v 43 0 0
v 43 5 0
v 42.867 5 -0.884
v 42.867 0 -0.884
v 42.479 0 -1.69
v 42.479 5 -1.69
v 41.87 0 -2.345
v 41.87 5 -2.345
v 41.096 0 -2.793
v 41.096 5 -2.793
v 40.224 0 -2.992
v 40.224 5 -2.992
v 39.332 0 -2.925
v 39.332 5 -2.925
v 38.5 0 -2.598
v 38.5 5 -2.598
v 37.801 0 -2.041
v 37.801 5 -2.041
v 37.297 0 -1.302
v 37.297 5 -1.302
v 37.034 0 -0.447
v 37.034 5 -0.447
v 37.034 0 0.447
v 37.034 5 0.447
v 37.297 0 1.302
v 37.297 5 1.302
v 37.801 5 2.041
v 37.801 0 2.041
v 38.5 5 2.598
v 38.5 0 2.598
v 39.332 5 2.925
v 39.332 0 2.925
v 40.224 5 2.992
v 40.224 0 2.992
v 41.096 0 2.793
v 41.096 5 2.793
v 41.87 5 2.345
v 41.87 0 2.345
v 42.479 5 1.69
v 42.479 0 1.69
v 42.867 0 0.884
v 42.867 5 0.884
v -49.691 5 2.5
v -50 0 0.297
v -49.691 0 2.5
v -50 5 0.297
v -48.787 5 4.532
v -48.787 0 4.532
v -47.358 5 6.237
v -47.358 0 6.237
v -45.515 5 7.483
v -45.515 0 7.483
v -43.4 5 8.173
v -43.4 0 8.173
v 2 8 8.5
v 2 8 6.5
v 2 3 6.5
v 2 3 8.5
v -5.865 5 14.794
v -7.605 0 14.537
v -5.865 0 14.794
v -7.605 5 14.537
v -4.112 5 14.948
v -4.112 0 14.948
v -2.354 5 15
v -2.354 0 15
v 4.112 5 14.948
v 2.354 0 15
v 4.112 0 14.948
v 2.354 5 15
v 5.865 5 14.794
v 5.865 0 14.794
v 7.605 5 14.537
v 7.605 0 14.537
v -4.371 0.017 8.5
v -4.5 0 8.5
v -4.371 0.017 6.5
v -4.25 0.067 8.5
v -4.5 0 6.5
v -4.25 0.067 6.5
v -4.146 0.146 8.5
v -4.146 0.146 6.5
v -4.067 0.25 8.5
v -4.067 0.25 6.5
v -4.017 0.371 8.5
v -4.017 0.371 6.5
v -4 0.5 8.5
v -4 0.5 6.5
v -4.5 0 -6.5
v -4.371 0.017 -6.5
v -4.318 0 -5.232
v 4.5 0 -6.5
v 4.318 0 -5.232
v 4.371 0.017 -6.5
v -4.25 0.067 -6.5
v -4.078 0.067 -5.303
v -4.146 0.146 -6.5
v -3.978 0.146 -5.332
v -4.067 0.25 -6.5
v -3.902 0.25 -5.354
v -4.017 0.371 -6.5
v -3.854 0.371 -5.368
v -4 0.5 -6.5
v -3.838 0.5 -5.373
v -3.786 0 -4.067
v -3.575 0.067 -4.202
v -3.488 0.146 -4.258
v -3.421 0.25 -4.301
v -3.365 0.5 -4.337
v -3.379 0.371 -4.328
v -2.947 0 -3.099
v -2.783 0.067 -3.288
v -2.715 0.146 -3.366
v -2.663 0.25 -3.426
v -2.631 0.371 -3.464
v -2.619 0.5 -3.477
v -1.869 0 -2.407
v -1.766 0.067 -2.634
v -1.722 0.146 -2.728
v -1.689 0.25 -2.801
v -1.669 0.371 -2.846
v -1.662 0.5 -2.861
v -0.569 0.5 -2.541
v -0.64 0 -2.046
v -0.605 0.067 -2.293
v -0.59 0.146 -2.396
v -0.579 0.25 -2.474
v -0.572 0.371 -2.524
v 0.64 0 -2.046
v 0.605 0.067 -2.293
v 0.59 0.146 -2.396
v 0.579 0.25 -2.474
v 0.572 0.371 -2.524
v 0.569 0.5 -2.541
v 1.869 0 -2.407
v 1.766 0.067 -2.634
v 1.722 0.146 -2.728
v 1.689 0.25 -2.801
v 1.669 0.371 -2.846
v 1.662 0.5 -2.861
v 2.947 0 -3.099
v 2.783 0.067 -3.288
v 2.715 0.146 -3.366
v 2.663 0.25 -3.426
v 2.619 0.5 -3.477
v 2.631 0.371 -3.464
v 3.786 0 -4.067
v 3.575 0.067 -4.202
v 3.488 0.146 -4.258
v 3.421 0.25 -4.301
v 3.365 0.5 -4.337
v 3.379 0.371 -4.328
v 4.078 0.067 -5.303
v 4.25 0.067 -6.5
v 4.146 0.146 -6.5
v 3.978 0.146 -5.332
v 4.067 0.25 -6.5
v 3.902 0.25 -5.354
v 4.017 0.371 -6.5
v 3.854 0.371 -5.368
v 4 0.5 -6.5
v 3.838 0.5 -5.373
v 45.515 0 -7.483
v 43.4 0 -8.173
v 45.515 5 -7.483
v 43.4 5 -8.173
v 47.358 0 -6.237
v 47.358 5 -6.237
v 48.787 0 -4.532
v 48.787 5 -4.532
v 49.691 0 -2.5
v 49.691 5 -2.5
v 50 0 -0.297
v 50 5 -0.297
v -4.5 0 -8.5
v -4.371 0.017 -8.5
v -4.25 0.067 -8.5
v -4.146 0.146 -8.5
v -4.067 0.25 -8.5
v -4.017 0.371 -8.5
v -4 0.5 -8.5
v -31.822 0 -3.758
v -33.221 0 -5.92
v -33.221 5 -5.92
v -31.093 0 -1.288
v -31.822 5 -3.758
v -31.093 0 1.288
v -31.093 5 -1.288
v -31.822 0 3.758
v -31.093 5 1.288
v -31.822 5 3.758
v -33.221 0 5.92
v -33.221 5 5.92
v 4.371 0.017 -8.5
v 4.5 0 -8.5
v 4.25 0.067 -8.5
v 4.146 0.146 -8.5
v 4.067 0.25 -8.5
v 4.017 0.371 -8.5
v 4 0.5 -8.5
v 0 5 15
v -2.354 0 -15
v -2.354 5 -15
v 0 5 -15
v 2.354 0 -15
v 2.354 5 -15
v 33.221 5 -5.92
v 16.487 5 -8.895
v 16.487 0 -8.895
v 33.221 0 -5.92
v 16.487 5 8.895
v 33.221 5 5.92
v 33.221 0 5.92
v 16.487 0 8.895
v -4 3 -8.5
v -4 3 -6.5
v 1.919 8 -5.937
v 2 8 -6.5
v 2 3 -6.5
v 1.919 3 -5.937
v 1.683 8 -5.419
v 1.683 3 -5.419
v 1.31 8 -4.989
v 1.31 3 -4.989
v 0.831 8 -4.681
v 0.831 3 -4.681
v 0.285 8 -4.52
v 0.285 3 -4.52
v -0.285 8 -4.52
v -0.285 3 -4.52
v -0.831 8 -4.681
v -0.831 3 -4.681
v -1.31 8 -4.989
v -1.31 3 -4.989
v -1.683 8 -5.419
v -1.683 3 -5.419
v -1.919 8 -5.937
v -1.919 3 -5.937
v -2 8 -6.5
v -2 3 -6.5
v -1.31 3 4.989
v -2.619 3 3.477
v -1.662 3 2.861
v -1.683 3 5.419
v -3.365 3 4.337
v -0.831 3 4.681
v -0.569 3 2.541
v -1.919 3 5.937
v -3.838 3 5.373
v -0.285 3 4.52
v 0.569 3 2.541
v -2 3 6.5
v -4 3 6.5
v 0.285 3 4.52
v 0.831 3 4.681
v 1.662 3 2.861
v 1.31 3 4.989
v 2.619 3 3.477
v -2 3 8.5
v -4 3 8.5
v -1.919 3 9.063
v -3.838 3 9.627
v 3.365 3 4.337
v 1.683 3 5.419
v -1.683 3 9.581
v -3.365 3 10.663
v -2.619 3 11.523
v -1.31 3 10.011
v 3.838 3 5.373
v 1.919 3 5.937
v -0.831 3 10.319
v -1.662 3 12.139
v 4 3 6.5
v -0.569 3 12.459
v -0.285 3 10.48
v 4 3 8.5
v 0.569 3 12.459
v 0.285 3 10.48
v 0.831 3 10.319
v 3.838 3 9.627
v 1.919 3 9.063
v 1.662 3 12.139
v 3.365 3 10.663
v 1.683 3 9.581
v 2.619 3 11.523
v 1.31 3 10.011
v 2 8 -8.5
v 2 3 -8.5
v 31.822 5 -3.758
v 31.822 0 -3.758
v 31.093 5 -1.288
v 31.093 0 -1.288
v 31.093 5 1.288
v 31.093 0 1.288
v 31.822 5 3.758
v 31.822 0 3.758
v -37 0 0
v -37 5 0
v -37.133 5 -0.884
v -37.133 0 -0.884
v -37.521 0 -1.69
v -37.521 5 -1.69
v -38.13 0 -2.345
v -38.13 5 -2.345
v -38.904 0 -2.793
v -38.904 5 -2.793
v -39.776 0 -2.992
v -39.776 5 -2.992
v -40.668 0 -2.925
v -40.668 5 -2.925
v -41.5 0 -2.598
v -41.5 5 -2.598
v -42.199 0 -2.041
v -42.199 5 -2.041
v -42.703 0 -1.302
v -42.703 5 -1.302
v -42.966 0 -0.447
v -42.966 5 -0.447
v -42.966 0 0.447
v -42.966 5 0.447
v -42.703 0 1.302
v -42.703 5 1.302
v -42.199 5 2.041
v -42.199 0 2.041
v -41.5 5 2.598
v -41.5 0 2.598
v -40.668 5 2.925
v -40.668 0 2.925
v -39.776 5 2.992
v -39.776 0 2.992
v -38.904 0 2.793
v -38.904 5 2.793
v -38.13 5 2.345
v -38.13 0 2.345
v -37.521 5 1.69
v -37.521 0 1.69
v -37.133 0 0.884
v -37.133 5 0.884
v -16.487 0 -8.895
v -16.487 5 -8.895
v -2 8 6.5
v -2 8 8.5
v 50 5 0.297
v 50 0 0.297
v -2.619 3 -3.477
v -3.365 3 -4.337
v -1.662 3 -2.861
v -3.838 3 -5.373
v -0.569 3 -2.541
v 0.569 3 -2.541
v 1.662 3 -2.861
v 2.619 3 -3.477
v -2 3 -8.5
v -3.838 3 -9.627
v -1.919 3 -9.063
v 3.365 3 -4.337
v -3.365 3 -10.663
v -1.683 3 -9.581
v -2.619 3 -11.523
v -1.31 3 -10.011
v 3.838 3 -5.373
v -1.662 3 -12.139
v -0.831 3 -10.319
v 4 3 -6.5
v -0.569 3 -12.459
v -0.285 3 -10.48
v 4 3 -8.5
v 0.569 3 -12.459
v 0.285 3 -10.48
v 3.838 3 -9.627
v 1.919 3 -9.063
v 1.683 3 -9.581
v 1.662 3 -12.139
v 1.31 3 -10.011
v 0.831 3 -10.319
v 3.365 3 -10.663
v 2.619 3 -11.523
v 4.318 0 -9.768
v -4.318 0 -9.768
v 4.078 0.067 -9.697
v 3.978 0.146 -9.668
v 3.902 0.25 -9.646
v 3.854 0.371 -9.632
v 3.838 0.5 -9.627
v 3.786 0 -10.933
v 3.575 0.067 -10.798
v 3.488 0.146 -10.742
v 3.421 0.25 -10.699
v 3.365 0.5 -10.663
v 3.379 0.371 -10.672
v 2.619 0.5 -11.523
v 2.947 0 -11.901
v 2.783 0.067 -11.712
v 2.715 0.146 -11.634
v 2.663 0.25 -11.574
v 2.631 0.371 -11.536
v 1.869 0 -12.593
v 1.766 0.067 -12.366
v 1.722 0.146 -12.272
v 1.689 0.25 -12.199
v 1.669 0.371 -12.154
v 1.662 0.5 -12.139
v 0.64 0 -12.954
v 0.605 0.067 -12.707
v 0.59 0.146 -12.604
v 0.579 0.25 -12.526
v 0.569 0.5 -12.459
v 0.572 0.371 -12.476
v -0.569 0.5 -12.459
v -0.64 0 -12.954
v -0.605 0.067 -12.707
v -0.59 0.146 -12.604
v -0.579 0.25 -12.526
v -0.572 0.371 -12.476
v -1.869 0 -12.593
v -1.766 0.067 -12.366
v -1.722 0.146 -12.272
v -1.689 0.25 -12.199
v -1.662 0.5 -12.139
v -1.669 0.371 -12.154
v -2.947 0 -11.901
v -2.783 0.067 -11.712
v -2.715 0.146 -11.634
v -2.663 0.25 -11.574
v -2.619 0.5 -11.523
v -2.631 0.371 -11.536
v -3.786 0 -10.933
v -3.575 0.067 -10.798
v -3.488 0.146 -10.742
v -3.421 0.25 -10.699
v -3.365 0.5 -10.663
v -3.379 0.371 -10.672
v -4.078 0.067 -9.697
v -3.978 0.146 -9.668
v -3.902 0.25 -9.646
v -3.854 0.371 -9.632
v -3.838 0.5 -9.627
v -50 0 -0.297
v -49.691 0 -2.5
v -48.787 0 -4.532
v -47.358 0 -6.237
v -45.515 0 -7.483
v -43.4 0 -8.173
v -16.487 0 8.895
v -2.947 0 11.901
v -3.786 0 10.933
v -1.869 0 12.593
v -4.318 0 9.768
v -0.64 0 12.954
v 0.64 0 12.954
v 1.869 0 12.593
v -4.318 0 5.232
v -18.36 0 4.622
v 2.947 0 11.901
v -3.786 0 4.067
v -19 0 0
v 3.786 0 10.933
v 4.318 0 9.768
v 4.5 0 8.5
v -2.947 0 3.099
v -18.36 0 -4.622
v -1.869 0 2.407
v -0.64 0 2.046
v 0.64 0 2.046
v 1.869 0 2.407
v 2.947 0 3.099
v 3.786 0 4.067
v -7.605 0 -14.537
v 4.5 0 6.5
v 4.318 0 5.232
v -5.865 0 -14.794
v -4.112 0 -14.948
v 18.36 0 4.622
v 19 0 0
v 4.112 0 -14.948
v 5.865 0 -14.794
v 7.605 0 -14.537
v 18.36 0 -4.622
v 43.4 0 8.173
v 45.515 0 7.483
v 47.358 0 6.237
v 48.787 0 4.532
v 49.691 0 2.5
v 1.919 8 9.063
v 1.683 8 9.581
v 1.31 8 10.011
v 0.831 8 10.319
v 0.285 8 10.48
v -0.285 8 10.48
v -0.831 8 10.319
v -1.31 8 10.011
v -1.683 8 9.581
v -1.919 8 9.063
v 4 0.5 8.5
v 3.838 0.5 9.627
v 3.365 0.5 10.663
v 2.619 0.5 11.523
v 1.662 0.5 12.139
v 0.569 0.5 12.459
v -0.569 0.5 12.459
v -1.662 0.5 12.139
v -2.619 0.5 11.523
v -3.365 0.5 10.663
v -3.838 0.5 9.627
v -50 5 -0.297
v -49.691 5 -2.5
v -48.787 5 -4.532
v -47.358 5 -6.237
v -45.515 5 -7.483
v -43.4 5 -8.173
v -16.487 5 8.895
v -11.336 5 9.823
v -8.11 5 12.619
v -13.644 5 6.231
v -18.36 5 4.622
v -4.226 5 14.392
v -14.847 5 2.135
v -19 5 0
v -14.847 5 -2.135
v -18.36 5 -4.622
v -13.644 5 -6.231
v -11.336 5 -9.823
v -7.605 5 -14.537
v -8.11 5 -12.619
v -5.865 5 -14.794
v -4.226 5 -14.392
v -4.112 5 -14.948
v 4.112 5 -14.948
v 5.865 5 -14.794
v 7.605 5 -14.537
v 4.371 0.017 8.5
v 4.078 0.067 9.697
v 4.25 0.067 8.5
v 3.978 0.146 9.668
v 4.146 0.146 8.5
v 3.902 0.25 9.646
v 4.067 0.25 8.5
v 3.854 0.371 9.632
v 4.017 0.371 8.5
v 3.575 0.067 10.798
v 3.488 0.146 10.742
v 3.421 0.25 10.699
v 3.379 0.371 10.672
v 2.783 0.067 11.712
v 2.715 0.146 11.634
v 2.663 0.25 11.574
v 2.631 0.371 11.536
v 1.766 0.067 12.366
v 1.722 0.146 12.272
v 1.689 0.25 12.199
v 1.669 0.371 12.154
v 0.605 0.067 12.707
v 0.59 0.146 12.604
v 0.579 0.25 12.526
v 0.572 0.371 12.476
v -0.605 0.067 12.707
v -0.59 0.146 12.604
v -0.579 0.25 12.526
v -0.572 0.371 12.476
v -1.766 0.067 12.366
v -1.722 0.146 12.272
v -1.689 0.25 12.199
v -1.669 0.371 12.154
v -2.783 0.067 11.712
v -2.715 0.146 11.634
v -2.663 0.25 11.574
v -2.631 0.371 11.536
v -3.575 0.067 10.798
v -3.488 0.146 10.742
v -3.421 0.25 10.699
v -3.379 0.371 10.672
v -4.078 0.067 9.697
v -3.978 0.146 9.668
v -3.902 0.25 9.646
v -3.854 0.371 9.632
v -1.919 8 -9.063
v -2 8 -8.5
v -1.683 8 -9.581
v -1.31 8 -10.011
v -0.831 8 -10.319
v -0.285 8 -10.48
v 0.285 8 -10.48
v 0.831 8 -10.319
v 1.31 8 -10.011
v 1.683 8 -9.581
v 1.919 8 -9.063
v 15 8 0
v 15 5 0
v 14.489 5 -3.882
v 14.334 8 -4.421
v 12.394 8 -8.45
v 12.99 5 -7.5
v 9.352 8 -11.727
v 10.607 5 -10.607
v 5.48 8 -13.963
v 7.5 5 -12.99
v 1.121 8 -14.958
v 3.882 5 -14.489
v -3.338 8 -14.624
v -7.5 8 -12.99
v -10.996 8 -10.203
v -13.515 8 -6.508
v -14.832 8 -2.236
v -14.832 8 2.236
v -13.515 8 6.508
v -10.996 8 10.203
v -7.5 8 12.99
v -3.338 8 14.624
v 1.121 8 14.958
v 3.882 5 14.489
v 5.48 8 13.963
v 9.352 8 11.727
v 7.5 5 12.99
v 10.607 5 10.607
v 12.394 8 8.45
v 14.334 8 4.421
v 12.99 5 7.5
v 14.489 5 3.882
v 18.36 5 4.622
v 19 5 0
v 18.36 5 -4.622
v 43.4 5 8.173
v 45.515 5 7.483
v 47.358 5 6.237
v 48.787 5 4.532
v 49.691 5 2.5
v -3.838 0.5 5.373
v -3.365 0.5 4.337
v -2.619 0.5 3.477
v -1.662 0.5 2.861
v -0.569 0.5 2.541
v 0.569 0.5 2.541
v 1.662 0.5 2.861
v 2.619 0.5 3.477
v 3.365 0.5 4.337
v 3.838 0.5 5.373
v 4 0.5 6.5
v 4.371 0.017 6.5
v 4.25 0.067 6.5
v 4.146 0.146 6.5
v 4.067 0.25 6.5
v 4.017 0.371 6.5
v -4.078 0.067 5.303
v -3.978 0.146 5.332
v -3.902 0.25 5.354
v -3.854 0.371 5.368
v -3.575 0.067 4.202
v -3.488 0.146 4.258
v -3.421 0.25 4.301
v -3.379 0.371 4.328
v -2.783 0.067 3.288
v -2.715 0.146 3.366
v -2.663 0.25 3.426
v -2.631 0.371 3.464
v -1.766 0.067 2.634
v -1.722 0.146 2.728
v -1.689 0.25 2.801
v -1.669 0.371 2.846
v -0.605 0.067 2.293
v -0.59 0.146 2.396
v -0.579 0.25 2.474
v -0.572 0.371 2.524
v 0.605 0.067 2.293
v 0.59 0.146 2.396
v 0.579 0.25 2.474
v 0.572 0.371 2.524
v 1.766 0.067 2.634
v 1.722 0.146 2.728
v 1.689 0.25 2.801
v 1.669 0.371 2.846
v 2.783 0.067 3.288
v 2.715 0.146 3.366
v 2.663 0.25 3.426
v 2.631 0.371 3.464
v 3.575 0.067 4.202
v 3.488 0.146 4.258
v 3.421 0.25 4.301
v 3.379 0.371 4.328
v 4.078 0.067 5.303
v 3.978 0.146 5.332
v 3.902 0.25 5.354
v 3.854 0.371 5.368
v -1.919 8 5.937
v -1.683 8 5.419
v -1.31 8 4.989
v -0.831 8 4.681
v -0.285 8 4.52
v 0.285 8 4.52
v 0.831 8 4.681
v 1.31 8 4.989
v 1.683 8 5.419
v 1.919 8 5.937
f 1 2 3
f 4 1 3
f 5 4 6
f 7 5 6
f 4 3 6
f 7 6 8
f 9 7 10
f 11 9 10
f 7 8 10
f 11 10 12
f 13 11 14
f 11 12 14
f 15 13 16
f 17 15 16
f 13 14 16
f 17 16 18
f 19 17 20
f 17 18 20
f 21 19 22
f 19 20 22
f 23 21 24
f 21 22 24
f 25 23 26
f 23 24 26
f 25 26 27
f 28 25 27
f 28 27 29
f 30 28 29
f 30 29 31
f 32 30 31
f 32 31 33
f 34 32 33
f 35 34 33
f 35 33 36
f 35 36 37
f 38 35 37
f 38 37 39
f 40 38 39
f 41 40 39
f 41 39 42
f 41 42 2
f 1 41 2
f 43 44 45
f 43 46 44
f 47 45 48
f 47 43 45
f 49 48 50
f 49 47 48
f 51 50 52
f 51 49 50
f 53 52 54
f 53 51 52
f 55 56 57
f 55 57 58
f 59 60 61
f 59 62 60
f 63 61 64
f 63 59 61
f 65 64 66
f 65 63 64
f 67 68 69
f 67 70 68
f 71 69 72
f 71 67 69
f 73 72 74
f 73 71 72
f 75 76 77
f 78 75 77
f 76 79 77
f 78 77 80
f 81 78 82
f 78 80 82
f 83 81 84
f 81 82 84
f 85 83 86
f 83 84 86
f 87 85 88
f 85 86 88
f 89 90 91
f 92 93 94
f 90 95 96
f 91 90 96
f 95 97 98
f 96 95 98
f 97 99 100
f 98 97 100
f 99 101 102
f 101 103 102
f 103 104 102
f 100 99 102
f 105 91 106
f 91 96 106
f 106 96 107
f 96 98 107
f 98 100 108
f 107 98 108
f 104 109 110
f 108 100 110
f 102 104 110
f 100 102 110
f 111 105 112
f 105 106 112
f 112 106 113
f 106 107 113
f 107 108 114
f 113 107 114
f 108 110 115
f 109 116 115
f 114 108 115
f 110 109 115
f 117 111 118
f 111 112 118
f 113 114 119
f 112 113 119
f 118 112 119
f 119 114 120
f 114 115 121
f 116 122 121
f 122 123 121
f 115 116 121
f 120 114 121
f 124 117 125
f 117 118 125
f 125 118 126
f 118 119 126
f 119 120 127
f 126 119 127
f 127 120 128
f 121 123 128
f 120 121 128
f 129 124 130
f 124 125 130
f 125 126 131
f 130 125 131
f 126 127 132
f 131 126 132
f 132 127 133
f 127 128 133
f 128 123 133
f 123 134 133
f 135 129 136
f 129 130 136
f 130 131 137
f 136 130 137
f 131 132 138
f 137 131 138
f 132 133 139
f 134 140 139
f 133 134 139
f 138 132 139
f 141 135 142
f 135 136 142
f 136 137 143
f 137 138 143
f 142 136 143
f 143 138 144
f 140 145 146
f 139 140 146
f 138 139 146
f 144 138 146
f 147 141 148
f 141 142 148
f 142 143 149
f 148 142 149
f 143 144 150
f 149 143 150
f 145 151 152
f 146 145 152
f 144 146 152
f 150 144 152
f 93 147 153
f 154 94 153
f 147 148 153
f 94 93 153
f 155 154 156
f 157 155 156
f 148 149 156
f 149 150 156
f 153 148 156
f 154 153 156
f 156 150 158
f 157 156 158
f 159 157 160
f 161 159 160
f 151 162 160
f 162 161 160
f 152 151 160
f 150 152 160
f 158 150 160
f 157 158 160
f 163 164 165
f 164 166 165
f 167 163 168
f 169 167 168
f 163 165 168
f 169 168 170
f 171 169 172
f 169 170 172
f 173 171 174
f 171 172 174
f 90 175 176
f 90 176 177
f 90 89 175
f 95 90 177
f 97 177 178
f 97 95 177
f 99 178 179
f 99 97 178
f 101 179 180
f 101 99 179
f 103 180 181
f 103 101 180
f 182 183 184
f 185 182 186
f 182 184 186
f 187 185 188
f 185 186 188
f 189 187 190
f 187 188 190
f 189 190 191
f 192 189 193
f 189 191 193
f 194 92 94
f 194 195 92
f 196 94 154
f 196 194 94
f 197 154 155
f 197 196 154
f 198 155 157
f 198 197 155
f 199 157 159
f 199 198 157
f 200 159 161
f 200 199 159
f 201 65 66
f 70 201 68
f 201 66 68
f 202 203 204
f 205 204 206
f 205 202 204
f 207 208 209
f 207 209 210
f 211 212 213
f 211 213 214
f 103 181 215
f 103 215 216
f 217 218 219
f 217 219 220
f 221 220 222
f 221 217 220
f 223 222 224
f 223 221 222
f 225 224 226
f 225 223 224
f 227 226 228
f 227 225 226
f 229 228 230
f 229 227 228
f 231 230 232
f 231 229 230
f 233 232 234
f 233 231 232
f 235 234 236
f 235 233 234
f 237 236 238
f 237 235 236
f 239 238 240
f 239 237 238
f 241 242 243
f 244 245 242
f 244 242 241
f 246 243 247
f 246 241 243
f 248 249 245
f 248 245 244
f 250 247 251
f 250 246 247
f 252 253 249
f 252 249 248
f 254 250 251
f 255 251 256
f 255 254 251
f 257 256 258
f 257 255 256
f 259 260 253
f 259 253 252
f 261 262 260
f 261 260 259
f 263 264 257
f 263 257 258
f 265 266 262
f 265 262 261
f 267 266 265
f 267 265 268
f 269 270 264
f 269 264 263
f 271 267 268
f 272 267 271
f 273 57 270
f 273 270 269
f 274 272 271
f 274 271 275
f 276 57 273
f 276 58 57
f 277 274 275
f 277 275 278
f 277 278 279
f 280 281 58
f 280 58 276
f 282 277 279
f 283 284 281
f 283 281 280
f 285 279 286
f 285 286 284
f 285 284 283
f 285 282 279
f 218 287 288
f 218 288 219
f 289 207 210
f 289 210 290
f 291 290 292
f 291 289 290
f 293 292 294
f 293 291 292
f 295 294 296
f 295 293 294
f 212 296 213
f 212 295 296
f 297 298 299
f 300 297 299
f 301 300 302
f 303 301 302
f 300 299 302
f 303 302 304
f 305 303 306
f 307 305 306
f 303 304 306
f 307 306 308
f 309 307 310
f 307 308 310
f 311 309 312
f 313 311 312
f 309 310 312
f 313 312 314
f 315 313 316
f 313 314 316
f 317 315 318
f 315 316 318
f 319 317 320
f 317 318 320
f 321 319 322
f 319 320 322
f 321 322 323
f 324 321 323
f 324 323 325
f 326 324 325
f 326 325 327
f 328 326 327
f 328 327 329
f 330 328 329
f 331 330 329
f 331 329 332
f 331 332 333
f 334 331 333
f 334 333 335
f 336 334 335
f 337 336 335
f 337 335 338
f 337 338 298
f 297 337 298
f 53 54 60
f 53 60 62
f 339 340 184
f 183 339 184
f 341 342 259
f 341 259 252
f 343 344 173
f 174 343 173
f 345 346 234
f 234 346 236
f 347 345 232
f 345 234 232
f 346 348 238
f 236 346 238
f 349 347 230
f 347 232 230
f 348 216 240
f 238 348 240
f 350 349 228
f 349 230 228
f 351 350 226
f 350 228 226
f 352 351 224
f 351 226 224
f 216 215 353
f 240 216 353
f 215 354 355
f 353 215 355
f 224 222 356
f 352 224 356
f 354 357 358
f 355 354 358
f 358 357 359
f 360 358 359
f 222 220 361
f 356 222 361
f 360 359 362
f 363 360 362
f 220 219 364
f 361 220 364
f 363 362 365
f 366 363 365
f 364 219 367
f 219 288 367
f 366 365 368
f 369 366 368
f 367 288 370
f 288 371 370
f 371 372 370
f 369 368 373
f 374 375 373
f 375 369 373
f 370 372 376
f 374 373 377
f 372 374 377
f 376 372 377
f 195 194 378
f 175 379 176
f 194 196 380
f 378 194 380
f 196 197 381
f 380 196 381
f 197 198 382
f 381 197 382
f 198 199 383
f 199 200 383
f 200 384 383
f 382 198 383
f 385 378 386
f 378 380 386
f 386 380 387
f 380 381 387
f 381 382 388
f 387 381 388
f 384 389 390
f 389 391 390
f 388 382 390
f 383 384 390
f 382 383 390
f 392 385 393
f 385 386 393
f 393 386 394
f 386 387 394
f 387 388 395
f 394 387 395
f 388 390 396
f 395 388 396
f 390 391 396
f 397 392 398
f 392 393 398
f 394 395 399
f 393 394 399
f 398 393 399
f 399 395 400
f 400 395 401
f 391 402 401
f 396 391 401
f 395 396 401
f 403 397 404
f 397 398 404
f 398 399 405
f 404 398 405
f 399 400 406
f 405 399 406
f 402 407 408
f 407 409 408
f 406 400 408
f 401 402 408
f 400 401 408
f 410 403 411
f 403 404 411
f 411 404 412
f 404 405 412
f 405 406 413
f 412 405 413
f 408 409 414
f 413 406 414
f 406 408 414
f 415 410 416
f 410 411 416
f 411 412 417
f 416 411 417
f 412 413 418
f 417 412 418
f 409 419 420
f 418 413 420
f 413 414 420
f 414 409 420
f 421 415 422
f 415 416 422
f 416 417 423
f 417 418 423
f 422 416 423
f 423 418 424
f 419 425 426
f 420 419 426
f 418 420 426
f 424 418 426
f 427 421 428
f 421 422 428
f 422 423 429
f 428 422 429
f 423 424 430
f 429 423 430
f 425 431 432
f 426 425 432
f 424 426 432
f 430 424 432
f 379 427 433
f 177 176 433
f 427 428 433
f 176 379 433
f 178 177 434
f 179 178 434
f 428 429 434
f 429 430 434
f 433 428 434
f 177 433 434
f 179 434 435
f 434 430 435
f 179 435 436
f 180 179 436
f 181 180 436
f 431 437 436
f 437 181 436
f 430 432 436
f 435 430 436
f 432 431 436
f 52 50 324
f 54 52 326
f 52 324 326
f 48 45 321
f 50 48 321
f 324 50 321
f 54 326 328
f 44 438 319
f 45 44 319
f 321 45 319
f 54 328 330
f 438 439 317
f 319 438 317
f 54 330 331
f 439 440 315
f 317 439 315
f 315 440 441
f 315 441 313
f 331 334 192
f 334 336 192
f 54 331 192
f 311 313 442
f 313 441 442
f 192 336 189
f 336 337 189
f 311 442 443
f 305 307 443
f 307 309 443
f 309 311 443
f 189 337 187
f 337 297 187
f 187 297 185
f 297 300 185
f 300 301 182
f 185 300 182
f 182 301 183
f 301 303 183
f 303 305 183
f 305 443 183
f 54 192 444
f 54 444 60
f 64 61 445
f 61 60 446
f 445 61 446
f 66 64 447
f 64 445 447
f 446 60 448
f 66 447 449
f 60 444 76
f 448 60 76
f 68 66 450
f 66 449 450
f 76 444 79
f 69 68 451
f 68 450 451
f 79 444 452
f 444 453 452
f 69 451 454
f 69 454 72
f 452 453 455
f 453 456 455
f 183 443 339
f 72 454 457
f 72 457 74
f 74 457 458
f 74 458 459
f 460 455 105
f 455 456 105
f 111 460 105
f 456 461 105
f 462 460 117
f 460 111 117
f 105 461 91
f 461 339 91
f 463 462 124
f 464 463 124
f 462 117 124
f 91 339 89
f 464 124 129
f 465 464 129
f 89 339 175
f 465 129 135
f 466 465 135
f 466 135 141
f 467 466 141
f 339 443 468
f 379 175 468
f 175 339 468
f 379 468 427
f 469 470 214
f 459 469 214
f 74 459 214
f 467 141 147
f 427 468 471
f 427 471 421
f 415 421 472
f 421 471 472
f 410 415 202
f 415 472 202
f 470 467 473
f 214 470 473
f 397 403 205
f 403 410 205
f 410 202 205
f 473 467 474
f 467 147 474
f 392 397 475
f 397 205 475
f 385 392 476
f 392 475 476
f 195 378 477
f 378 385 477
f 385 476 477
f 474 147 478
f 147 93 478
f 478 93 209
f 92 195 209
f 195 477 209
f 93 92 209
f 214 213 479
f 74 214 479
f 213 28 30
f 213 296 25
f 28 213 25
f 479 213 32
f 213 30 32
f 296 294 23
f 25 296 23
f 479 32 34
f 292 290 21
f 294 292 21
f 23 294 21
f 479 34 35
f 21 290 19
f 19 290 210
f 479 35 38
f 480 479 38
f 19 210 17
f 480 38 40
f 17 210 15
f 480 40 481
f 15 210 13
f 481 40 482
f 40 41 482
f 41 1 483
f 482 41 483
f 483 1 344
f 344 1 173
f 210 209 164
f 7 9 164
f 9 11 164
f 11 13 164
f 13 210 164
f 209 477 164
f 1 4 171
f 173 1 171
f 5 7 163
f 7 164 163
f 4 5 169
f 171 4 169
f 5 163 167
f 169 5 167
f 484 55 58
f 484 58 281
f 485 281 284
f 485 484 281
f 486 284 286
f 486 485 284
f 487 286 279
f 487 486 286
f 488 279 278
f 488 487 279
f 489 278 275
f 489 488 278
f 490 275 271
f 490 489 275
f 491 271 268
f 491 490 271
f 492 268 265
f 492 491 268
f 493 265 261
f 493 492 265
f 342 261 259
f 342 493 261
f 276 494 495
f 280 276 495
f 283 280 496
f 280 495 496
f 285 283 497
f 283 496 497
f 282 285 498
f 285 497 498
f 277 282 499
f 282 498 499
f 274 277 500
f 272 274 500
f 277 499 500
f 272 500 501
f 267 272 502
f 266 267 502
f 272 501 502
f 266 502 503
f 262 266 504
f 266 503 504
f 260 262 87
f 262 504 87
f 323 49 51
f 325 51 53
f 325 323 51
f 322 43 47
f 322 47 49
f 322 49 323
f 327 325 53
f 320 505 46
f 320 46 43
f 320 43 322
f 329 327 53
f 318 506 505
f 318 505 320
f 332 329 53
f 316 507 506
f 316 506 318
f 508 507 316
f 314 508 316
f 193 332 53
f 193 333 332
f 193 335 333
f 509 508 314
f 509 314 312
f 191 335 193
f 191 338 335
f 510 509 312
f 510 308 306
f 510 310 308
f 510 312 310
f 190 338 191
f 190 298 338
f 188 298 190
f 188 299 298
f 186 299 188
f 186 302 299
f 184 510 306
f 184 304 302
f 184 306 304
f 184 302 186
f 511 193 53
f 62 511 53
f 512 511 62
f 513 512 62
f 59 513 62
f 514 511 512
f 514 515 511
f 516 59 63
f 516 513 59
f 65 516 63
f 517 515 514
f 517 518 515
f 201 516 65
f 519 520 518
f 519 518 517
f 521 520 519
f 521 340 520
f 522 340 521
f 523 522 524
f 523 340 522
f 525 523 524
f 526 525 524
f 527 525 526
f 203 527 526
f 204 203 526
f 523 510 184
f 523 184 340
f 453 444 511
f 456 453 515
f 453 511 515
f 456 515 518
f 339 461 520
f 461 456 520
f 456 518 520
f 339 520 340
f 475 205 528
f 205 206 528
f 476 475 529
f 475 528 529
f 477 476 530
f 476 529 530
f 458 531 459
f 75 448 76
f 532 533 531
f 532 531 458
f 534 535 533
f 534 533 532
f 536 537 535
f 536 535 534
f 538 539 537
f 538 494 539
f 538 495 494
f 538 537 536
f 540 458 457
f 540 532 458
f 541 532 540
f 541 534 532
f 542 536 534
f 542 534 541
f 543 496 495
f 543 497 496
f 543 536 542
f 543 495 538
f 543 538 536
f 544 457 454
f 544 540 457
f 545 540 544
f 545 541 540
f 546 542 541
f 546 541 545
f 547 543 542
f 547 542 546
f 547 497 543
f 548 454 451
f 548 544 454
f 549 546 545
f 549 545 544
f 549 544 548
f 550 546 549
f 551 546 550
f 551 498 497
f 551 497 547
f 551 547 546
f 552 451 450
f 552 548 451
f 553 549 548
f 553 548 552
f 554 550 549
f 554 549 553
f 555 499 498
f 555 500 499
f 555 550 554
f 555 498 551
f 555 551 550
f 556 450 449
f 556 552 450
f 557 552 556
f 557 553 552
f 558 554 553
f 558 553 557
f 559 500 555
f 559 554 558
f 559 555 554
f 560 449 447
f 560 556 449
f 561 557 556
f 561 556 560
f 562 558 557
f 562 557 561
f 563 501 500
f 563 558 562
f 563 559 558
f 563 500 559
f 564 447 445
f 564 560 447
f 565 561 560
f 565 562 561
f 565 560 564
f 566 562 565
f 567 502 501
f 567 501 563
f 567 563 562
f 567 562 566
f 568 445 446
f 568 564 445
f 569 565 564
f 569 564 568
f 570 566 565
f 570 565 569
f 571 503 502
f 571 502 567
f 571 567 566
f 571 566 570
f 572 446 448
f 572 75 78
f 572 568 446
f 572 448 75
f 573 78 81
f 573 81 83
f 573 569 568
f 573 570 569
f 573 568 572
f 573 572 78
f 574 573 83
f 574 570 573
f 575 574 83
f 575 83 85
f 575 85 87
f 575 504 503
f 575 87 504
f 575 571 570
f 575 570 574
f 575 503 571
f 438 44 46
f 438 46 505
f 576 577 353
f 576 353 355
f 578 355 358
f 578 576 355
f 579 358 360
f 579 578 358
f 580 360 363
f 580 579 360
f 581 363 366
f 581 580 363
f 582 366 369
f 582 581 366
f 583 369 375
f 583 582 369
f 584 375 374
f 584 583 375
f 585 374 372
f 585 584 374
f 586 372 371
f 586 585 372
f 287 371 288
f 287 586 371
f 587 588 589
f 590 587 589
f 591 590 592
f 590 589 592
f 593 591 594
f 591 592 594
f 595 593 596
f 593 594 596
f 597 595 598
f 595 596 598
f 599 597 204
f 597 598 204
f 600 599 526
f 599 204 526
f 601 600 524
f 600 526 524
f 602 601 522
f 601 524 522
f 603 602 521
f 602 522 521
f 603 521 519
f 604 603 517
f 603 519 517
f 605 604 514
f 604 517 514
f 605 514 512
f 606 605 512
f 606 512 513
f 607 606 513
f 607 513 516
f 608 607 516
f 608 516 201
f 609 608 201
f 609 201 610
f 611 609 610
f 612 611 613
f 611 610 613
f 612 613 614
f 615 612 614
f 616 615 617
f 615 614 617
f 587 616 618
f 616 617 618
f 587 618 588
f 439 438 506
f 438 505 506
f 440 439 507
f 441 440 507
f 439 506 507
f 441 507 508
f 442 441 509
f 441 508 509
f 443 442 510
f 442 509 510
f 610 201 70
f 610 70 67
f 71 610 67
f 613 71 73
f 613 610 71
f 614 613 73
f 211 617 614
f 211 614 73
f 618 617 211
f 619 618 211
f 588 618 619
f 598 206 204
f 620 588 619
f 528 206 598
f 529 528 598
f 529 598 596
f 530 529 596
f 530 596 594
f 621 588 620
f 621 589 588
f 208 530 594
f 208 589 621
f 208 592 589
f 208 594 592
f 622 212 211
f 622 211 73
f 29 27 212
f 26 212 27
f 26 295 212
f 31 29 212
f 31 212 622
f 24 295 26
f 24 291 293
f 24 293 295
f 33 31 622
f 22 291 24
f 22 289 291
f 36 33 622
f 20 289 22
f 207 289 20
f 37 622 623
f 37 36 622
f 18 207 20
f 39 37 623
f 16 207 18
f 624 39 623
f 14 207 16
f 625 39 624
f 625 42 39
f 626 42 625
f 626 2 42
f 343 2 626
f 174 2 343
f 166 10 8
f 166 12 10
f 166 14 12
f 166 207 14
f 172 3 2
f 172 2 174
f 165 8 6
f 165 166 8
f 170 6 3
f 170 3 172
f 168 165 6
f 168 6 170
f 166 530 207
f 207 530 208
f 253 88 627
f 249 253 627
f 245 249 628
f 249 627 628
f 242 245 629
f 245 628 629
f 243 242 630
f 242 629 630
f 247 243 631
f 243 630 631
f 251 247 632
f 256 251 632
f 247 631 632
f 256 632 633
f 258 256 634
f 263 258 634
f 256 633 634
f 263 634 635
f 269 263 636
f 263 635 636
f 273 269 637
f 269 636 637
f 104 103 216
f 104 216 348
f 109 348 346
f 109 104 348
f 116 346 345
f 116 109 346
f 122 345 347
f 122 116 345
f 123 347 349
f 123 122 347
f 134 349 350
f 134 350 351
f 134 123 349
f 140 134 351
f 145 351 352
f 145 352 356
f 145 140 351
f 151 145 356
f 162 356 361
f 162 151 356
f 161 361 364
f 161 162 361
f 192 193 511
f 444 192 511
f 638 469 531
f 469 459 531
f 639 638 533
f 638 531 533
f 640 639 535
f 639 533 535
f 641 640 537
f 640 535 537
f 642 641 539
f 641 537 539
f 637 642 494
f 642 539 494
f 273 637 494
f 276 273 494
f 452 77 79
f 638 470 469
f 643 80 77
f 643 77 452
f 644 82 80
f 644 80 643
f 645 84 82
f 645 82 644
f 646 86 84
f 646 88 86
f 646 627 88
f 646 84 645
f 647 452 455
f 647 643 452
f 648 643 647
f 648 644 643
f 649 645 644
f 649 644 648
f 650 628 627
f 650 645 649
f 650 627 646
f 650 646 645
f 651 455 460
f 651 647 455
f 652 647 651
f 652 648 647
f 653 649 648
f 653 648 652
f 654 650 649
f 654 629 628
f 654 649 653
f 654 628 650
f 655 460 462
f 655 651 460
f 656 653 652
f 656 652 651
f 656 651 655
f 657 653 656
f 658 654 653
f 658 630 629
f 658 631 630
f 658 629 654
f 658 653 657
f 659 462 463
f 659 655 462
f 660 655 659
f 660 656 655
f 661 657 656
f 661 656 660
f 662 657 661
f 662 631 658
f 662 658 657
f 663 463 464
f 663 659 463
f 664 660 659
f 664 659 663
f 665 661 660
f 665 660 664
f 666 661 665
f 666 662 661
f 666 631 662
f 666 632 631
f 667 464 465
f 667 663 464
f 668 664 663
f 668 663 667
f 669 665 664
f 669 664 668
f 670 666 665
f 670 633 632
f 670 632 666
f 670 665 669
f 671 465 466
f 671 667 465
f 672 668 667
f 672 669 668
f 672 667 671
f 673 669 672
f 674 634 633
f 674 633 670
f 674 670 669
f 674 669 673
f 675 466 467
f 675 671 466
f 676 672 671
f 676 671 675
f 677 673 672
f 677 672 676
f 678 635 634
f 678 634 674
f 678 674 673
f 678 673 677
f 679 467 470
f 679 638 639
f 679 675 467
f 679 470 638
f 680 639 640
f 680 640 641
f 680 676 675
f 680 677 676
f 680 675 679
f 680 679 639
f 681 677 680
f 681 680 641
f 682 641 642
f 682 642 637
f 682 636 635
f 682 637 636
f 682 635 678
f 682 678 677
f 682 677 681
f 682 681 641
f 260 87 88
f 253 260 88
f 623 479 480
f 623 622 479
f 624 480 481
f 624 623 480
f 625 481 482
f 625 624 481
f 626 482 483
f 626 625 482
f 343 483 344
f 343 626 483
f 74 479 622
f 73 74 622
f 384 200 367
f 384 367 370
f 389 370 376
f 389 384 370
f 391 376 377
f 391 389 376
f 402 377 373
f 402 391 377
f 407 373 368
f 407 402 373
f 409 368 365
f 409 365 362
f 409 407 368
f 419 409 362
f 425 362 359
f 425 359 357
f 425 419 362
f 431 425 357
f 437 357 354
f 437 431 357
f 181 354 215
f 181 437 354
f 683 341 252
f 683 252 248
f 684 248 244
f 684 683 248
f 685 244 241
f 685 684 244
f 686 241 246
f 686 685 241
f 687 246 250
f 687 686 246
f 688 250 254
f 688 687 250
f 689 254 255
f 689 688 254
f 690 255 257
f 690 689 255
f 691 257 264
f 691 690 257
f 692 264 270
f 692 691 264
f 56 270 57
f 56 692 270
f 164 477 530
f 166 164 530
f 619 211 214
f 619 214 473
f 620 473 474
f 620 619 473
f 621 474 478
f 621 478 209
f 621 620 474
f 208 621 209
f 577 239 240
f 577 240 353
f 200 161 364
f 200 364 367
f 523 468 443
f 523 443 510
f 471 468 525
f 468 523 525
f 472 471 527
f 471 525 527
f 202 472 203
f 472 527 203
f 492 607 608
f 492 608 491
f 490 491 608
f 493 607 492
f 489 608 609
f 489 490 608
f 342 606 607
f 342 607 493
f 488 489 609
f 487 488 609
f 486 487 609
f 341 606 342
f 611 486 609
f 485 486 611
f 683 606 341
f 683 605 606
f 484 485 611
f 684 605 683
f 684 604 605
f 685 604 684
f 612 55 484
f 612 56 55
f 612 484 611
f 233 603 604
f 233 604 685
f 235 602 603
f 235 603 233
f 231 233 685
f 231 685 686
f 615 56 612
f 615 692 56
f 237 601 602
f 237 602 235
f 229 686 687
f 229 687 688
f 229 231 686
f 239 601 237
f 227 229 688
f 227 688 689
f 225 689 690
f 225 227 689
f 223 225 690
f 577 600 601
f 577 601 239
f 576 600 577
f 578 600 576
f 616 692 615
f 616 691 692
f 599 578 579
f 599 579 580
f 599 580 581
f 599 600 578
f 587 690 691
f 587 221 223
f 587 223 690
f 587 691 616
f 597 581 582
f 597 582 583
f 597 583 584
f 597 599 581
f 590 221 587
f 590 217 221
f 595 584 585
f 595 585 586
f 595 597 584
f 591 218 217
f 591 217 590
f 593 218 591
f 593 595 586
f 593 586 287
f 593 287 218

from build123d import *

# Parameters (mm, degrees)
SKETCH1_W           = 100
SKETCH1_H           = 30
BOSS_EXTRUDE1_DEPTH = 5
SKETCH2_R           = 15
BOSS_EXTRUDE2_DEPTH = 3
CUT_EXTRUDE1_DEPTH  = 9
SKETCH4_R           = 3
CUT_EXTRUDE2_DEPTH  = 6
CHAMFER1_SIZE       = 8
CHAMFER1_SIZE2      = 45
CHAMFER2_SIZE       = 45
CHAMFER2_SIZE2      = 8
CHAMFER3_SIZE       = 45
CHAMFER3_SIZE2      = 8
CHAMFER4_SIZE       = 8
CHAMFER4_SIZE2      = 45
FILLET1_R           = 8
CUT_EXTRUDE3_DEPTH  = 6
FILLET2_R           = 30
CUT_EXTRUDE4_DEPTH  = 3
FILLET3_R           = 0.5


with BuildPart() as part:
    # Sketch1 → Boss-Extrude1 (new body)
    with BuildSketch(Plane(origin=(0, 0, 0), x_dir=(1, 0, 0), z_dir=(0, 1, 0))):
        Rectangle(SKETCH1_W, SKETCH1_H)
    extrude(amount=BOSS_EXTRUDE1_DEPTH)

    # Sketch2 → Boss-Extrude2 (add)
    with BuildSketch(Plane(origin=(0, 5, 0), x_dir=(1, 0, 0), z_dir=(0, 1, 0))):
        Circle(SKETCH2_R)
    extrude(amount=BOSS_EXTRUDE2_DEPTH)

    # Sketch3 → Cut-Extrude1 (cut, through all)
    with BuildSketch(Plane(origin=(0, 8, 0), x_dir=(1, 0, 0), z_dir=(0, 1, 0))):
        with BuildLine():
            Line((-2, 6.5), (-2, 8.5))
            ThreePointArc((-2, 8.5), (0, 10.5), (2, 8.5))
            Line((2, 8.5), (2, 6.5))
            ThreePointArc((2, 6.5), (0, 4.5), (-2, 6.5))
        make_face()
        with BuildLine():
            Line((-2, -8.5), (-2, -6.5))
            ThreePointArc((-2, -6.5), (0, -4.5), (2, -6.5))
            Line((2, -6.5), (2, -8.5))
            ThreePointArc((2, -8.5), (0, -10.5), (-2, -8.5))
        make_face()
    extrude(amount=-CUT_EXTRUDE1_DEPTH, mode=Mode.SUBTRACT)

    # Sketch4 → Cut-Extrude2 (cut, through all)
    with BuildSketch(Plane(origin=(0, 5, 0), x_dir=(1, 0, 0), z_dir=(0, 1, 0))):
        with Locations((40, 0)):
            Circle(SKETCH4_R)
        with Locations((-40, 0)):
            Circle(SKETCH4_R)
    extrude(amount=-CUT_EXTRUDE2_DEPTH, mode=Mode.SUBTRACT)

    # Chamfer1
    chamfer1_edges = [part.edges().sort_by_distance(p)[0] for p in [
        (50, 2.5, -15),
    ]]
    chamfer1_side = [part.faces().sort_by_distance(p)[0] for p in [
        (50, 2.5, 0),
    ]]
    chamfer(chamfer1_edges, length=CHAMFER1_SIZE, length2=CHAMFER1_SIZE2, reference=chamfer1_side[0])

    # Chamfer2
    chamfer2_edges = [part.edges().sort_by_distance(p)[0] for p in [
        (50, 2.5, 15),
    ]]
    chamfer2_side = [part.faces().sort_by_distance(p)[0] for p in [
        (0, 2.5, 15),
    ]]
    chamfer(chamfer2_edges, length=CHAMFER2_SIZE, length2=CHAMFER2_SIZE2, reference=chamfer2_side[0])

    # Chamfer3
    chamfer3_edges = [part.edges().sort_by_distance(p)[0] for p in [
        (-50, 2.5, -15),
    ]]
    chamfer3_side = [part.faces().sort_by_distance(p)[0] for p in [
        (-22.5, 2.5, -15),
    ]]
    chamfer(chamfer3_edges, length=CHAMFER3_SIZE, length2=CHAMFER3_SIZE2, reference=chamfer3_side[0])

    # Chamfer4
    chamfer4_edges = [part.edges().sort_by_distance(p)[0] for p in [
        (-50, 2.5, 15),
    ]]
    chamfer4_side = [part.faces().sort_by_distance(p)[0] for p in [
        (-50, 2.5, 4),
    ]]
    chamfer(chamfer4_edges, length=CHAMFER4_SIZE, length2=CHAMFER4_SIZE2, reference=chamfer4_side[0])

    # Fillet1
    fillet1_edges = [part.edges().sort_by_distance(p)[0] for p in [
        (50, 2.5, -7),
        (50, 2.5, 7),
        (-50, 2.5, -7),
        (-50, 2.5, 7),
    ]]
    fillet(fillet1_edges, radius=FILLET1_R)

    # Sketch5 → Cut-Extrude3 (cut, through all)
    with BuildSketch(Plane(origin=(0, 5, 0), x_dir=(1, 0, 0), z_dir=(0, 1, 0))):
        with BuildLine():
            Line((-16.487122597, 8.895126691), (-33.221241877, 5.920172153))
            ThreePointArc((-33.221241877, 5.920172153), (-31, 0), (-33.221241877, -5.920172153))
            Line((-33.221241877, -5.920172153), (-16.487122597, -8.895126691))
            ThreePointArc((-16.487122597, -8.895126691), (-19, 0), (-16.487122597, 8.895126691))
        make_face()
    cut_extrude3 = extrude(amount=-CUT_EXTRUDE3_DEPTH, mode=Mode.SUBTRACT)

    # Mirror2: Cut-Extrude3 across plane
    add(cut_extrude3.mirror(Plane(origin=(0, 0, 0), x_dir=(0, 0, 1), z_dir=(1, 0, 0))), mode=Mode.SUBTRACT)

    # Fillet2
    fillet2_edges = [part.edges().sort_by_distance(p)[0] for p in [
        (5, 2.5, -15),
        (5, 2.5, 15),
        (-5, 2.5, -15),
        (-5, 2.5, 15),
    ]]
    fillet(fillet2_edges, radius=FILLET2_R)

    # Sketch7 → Cut-Extrude4 (cut)
    with BuildSketch(Plane.XZ):
        with BuildLine():
            Line((-4, 8.5), (-4, 6.5))
            ThreePointArc((-4, 6.5), (0, 2.5), (4, 6.5))
            Line((4, 6.5), (4, 8.5))
            ThreePointArc((4, 8.5), (0, 12.5), (-4, 8.5))
        make_face()
    cut_extrude4 = extrude(amount=-CUT_EXTRUDE4_DEPTH, mode=Mode.SUBTRACT)

    # Mirror3: Cut-Extrude4 across plane
    add(cut_extrude4.mirror(Plane.XY), mode=Mode.SUBTRACT)

    # Fillet3
    fillet3_edges = [part.edges().sort_by_distance(p)[0] for p in [
        (0, 0, 12.5),
        (-4, 0, 7.5),
        (0, 0, 2.5),
        (4, 0, 7.5),
        (0, 0, -12.5),
        (-4, 0, -7.5),
        (0, 0, -2.5),
        (4, 0, -7.5),
    ]]
    fillet(fillet3_edges, radius=FILLET3_R)


solid = part.part
